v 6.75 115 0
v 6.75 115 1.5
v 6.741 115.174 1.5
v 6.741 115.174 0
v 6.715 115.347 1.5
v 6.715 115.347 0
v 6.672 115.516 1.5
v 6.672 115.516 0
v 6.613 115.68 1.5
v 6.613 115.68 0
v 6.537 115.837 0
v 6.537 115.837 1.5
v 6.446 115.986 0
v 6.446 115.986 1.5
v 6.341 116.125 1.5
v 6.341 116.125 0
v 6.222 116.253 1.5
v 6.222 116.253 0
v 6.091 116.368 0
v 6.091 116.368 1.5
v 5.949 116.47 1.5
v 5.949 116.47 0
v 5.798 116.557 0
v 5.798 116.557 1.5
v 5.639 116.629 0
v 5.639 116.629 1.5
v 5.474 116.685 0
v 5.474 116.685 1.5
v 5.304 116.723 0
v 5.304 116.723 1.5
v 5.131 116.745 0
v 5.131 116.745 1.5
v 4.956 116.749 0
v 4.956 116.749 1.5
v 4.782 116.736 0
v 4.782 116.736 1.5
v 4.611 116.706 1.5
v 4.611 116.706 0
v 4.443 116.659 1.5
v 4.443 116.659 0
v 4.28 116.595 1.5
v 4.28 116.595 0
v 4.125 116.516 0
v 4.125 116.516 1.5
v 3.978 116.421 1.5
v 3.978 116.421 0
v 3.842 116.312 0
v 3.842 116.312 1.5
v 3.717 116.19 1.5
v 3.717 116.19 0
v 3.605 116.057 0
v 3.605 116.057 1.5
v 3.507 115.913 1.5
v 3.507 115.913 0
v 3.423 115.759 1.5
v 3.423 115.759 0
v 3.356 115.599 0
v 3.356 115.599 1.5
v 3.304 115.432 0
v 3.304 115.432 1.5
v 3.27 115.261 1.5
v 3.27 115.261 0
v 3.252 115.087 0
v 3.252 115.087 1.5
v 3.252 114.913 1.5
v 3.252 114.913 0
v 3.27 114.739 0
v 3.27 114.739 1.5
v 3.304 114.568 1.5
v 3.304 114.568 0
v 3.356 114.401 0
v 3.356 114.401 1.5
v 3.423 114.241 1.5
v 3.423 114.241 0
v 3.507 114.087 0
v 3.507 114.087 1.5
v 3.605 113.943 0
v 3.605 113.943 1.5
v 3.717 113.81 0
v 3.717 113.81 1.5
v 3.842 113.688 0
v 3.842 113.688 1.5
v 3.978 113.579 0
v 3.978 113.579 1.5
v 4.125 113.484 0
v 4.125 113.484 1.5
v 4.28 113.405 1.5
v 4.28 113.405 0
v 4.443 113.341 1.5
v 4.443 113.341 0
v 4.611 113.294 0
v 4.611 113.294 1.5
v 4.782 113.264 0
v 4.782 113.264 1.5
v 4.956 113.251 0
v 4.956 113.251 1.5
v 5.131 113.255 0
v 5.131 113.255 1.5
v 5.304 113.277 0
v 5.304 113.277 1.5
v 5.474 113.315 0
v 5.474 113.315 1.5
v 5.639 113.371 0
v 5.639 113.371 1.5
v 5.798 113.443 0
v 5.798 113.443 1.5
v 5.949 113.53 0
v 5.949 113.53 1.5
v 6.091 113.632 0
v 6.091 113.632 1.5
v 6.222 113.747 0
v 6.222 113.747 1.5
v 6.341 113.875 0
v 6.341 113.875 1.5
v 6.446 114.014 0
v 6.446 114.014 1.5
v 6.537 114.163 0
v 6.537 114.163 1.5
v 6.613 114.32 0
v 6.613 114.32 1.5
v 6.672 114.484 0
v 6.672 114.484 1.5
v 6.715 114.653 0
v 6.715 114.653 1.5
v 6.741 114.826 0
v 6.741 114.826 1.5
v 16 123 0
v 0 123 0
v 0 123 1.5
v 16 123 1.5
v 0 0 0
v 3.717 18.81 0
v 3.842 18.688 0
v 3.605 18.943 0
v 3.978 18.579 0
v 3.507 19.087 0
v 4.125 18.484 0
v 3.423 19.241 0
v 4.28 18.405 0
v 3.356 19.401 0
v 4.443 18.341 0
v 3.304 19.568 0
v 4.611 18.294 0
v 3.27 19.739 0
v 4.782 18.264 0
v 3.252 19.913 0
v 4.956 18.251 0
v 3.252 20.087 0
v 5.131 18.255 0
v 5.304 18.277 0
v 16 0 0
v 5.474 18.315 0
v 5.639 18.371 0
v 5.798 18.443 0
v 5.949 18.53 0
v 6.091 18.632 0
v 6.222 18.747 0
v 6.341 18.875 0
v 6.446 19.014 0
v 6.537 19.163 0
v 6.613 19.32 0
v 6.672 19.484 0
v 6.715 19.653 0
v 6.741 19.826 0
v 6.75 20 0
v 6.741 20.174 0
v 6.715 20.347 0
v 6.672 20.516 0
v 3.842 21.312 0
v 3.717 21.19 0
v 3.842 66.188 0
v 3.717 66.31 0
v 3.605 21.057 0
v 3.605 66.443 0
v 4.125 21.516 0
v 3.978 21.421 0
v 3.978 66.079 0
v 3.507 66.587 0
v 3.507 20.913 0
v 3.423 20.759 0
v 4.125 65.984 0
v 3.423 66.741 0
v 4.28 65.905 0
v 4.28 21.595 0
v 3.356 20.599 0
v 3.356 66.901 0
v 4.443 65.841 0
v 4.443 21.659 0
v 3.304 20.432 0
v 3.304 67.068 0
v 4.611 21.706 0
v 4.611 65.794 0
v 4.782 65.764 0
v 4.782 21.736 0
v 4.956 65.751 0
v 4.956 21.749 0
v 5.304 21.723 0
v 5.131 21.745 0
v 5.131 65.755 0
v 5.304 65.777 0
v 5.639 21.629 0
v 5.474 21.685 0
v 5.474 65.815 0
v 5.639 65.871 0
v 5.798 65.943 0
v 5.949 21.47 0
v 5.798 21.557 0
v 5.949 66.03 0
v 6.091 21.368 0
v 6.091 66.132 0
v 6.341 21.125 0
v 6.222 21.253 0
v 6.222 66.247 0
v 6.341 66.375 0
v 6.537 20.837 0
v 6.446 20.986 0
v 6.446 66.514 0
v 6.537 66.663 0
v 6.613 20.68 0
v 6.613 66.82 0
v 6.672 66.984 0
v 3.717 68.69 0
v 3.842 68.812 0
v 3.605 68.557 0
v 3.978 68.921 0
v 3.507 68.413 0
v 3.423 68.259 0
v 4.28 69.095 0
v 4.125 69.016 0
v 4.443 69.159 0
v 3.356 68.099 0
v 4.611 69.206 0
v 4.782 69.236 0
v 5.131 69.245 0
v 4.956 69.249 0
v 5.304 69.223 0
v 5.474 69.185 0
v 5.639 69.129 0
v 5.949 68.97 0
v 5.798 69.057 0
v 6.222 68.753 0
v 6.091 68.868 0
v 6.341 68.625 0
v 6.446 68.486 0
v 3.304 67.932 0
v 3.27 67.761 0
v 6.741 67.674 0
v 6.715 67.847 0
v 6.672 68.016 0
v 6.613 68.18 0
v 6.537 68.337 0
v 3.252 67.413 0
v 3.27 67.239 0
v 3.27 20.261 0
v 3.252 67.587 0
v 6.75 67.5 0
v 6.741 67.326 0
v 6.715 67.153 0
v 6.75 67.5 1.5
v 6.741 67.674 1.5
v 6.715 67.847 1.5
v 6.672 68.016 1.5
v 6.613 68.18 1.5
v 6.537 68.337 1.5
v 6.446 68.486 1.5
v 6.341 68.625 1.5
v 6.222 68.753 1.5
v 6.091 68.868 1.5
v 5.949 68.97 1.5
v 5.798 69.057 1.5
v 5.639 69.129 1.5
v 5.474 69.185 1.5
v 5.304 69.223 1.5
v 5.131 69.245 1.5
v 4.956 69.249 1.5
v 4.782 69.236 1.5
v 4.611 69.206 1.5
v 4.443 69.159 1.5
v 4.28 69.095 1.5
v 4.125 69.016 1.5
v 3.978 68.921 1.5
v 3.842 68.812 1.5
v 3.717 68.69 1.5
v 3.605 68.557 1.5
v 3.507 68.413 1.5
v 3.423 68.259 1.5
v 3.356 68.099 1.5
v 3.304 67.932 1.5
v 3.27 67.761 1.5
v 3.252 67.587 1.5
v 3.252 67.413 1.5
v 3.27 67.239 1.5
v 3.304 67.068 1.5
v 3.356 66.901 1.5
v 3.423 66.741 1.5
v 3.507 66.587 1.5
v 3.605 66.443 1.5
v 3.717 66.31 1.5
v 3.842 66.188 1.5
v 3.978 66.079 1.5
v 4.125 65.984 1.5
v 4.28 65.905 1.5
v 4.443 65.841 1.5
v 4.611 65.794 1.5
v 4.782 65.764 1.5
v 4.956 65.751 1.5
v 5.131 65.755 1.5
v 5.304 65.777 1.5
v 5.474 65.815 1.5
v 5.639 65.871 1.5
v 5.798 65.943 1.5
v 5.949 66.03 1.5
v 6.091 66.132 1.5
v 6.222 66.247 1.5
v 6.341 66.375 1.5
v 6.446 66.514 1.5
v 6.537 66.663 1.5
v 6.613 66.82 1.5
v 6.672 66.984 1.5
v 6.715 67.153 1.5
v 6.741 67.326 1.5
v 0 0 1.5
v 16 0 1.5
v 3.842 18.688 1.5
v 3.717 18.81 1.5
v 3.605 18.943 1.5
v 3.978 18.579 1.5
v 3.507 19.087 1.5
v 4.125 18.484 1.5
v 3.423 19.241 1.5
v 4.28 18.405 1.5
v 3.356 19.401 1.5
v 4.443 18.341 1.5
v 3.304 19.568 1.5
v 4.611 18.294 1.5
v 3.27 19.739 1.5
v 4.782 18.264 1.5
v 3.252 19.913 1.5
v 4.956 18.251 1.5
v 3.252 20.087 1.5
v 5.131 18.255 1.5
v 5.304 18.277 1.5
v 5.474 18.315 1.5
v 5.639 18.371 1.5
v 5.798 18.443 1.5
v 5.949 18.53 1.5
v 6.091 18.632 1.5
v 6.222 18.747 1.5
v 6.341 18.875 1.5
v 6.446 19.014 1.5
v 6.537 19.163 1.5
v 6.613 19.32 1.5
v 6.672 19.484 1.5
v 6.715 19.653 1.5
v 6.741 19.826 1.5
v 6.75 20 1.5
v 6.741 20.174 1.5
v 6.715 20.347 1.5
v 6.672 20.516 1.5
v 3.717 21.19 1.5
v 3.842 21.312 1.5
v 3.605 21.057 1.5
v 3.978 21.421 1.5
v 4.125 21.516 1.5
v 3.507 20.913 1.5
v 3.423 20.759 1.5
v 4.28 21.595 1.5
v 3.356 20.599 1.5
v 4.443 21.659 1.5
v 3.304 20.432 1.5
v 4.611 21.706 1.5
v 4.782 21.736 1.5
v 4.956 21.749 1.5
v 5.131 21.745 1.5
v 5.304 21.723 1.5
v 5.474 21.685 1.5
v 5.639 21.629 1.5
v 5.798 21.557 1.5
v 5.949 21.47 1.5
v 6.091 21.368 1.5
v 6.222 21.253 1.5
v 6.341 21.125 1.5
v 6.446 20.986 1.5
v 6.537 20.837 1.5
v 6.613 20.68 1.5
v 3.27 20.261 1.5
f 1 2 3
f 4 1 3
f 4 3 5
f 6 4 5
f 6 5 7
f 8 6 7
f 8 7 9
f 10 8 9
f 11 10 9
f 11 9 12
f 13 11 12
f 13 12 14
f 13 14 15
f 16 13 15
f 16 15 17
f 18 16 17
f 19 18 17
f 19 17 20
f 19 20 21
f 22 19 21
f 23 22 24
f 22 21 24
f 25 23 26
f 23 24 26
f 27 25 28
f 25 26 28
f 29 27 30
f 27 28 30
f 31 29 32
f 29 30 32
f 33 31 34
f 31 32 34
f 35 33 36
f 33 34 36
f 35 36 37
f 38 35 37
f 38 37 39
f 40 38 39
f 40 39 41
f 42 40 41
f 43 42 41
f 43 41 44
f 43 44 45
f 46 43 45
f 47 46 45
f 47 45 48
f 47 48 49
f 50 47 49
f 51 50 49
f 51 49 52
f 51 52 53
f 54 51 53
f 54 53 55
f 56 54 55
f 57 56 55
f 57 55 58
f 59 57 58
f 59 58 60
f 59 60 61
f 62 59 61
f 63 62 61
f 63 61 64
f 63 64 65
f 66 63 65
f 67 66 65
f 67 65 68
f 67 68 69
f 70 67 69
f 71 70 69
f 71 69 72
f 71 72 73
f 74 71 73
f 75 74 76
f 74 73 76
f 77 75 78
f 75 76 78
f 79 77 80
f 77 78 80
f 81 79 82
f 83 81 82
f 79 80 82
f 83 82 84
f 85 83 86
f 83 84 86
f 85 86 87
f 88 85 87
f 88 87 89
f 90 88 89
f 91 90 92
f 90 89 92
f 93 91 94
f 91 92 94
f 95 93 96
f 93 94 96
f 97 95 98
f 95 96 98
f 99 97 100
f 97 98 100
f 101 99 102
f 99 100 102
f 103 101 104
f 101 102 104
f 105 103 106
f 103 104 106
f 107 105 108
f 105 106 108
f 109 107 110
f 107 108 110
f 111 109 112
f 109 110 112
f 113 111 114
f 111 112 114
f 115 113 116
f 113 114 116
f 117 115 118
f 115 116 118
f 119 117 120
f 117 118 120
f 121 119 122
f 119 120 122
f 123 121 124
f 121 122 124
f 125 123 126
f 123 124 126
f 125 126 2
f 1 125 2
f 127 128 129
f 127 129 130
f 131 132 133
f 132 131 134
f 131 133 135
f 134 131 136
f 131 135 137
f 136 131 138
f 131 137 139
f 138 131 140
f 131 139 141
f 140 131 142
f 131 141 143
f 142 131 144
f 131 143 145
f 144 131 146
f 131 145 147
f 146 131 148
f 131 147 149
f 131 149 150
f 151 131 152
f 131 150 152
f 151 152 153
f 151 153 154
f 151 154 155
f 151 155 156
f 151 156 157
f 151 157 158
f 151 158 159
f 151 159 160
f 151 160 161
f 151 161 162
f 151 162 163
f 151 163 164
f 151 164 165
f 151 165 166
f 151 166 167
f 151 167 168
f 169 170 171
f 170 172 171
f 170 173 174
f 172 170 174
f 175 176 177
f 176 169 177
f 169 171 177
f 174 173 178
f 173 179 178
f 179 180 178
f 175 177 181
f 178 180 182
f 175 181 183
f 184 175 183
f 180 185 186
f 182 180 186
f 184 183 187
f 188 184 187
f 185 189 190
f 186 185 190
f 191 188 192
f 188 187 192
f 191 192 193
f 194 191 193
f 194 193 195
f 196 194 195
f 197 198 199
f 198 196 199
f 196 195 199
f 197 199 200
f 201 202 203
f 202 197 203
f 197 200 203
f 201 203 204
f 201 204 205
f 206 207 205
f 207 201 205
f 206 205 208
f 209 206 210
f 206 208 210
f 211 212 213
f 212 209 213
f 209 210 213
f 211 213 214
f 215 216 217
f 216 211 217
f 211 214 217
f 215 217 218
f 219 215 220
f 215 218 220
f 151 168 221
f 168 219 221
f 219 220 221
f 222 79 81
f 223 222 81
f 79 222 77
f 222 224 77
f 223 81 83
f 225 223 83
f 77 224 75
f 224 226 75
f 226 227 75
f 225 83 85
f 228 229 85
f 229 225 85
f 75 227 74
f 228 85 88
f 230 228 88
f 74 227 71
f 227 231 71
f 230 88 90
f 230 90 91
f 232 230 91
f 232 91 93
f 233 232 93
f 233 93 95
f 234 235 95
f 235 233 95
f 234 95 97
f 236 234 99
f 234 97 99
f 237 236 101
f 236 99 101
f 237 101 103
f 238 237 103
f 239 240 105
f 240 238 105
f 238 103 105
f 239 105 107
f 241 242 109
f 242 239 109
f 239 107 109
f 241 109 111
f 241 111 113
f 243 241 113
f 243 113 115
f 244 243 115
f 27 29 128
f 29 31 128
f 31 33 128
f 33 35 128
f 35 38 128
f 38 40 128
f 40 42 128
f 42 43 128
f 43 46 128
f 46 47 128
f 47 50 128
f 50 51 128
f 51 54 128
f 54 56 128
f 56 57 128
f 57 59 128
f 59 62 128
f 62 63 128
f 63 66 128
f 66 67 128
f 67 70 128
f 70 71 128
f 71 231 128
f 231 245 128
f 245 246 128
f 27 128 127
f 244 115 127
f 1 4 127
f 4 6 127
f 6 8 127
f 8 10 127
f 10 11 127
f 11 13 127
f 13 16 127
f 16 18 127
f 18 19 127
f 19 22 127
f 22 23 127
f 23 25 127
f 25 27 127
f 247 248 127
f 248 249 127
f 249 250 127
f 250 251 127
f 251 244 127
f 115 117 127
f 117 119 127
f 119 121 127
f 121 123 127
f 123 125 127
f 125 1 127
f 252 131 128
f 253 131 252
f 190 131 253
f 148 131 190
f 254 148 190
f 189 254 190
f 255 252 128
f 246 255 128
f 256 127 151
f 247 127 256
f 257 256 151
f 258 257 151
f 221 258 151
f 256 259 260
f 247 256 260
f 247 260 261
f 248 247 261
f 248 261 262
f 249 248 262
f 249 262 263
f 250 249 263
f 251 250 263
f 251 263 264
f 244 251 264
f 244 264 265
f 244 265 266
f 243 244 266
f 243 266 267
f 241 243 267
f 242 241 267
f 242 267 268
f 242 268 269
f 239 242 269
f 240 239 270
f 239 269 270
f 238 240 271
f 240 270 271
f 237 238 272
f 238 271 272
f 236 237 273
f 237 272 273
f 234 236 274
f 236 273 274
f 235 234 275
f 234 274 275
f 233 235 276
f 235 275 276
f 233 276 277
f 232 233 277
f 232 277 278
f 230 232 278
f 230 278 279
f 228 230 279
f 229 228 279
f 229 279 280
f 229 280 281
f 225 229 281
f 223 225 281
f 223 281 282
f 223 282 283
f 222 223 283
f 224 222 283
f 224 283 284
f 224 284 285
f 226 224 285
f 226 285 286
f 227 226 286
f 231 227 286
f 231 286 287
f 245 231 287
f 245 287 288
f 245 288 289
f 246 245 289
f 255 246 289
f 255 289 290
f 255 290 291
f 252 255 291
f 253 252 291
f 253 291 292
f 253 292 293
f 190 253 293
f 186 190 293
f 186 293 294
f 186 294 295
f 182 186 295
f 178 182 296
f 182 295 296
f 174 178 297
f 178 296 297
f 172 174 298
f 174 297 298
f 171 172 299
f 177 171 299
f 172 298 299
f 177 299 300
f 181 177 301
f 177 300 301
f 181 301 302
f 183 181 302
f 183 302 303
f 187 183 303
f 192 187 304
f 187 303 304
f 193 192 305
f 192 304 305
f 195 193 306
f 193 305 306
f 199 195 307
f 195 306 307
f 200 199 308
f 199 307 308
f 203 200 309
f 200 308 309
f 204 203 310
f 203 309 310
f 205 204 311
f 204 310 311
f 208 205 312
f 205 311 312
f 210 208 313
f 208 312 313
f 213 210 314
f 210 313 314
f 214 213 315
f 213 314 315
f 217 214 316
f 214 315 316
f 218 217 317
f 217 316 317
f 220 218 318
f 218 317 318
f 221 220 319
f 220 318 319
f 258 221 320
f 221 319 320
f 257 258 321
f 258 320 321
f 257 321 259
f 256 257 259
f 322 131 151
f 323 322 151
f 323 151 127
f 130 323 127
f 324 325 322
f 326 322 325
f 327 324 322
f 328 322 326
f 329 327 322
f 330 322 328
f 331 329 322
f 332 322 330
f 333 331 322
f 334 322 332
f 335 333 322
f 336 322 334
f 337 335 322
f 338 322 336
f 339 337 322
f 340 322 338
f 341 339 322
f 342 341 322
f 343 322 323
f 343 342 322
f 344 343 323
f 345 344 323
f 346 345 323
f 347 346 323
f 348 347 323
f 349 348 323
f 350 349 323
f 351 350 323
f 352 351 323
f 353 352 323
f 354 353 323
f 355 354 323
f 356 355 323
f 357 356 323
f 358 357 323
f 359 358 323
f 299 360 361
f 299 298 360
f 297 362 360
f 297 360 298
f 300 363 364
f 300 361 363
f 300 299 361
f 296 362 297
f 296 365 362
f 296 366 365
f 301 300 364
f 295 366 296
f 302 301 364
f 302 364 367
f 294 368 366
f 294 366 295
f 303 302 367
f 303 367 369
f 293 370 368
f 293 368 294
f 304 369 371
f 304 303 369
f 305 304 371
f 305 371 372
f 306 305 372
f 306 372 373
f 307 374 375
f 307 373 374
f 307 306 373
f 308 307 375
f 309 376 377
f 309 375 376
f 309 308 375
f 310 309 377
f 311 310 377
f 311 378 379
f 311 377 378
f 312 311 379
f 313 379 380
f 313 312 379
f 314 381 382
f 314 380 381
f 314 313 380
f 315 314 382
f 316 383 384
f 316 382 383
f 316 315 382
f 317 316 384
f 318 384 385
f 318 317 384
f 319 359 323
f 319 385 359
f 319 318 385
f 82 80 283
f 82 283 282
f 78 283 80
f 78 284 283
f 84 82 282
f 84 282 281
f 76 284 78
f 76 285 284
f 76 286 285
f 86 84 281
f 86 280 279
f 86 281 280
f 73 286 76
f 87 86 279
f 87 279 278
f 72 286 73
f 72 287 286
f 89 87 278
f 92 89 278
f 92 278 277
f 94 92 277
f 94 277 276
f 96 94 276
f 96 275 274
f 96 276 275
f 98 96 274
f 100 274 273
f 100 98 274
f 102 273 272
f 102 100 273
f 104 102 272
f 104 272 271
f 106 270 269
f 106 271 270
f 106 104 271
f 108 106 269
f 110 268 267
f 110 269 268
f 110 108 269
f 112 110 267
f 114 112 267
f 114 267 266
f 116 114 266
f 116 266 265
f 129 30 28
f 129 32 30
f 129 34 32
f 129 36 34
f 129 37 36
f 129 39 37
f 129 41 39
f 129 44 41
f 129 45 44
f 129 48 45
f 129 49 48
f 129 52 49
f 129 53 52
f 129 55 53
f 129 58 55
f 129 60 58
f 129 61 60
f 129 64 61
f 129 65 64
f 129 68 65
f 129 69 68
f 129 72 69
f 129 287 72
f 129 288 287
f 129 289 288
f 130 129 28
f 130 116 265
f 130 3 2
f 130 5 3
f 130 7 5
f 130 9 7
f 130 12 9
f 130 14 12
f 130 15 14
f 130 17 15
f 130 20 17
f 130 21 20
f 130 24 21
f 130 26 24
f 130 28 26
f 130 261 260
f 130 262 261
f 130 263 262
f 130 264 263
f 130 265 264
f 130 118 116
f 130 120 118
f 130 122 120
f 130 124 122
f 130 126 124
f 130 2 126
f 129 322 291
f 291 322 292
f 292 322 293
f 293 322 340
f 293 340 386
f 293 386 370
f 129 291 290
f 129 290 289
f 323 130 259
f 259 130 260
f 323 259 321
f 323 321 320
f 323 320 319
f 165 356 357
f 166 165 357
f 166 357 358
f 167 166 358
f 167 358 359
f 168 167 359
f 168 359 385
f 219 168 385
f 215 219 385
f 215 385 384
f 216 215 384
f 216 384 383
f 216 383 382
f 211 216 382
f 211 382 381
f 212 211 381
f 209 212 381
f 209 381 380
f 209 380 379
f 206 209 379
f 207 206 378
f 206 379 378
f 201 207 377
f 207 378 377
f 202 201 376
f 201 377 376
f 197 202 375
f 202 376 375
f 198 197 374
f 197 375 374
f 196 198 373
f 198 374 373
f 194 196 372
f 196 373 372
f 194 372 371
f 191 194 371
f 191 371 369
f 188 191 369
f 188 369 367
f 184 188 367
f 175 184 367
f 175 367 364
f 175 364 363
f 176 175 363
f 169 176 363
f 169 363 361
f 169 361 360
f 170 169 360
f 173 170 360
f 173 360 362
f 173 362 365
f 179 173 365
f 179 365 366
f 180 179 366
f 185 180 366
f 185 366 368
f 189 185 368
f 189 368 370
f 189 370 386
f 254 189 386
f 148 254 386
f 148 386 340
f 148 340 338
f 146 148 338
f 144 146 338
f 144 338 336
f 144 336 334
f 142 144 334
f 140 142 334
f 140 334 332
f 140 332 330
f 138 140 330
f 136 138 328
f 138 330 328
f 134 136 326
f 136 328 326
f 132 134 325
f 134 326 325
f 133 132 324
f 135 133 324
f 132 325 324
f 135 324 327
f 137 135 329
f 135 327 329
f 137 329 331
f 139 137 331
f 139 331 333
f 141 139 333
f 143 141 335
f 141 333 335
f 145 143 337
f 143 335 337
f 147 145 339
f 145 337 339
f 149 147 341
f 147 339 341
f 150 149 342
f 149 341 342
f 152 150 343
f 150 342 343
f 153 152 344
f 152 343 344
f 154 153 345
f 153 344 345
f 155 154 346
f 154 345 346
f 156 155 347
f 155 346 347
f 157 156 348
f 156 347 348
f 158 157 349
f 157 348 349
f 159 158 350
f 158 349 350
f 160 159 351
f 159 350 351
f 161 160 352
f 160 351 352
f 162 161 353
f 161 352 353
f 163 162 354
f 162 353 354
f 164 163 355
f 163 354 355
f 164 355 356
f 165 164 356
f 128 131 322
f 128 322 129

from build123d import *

# Parameters (mm, degrees)
SKETCH1_W           = 16
SKETCH1_H           = 123
BOSS_EXTRUDE1_DEPTH = 1.5
SKETCH2_R           = 1.75
CUT_EXTRUDE1_DEPTH  = 2.5
LPATTERN1_COUNT     = 3
LPATTERN1_PITCH     = 47.5


with BuildPart() as part:
    # Sketch1 → Boss-Extrude1 (new body)
    with BuildSketch(Plane.XY):
        with Locations((8, 61.5)):
            Rectangle(SKETCH1_W, SKETCH1_H)
    extrude(amount=BOSS_EXTRUDE1_DEPTH)

    # Sketch2 → Cut-Extrude1 (cut, through all)
    with BuildSketch(Plane.XY.offset(1.5)):
        with Locations((5, 20)):
            Circle(SKETCH2_R)
    cut_extrude1 = extrude(amount=-CUT_EXTRUDE1_DEPTH, mode=Mode.SUBTRACT)

    # LPattern1: Cut-Extrude1 ×3
    with Locations(*[(0, i * LPATTERN1_PITCH, 0) for i in range(1, LPATTERN1_COUNT)]):
        add(cut_extrude1, mode=Mode.SUBTRACT)


solid = part.part
